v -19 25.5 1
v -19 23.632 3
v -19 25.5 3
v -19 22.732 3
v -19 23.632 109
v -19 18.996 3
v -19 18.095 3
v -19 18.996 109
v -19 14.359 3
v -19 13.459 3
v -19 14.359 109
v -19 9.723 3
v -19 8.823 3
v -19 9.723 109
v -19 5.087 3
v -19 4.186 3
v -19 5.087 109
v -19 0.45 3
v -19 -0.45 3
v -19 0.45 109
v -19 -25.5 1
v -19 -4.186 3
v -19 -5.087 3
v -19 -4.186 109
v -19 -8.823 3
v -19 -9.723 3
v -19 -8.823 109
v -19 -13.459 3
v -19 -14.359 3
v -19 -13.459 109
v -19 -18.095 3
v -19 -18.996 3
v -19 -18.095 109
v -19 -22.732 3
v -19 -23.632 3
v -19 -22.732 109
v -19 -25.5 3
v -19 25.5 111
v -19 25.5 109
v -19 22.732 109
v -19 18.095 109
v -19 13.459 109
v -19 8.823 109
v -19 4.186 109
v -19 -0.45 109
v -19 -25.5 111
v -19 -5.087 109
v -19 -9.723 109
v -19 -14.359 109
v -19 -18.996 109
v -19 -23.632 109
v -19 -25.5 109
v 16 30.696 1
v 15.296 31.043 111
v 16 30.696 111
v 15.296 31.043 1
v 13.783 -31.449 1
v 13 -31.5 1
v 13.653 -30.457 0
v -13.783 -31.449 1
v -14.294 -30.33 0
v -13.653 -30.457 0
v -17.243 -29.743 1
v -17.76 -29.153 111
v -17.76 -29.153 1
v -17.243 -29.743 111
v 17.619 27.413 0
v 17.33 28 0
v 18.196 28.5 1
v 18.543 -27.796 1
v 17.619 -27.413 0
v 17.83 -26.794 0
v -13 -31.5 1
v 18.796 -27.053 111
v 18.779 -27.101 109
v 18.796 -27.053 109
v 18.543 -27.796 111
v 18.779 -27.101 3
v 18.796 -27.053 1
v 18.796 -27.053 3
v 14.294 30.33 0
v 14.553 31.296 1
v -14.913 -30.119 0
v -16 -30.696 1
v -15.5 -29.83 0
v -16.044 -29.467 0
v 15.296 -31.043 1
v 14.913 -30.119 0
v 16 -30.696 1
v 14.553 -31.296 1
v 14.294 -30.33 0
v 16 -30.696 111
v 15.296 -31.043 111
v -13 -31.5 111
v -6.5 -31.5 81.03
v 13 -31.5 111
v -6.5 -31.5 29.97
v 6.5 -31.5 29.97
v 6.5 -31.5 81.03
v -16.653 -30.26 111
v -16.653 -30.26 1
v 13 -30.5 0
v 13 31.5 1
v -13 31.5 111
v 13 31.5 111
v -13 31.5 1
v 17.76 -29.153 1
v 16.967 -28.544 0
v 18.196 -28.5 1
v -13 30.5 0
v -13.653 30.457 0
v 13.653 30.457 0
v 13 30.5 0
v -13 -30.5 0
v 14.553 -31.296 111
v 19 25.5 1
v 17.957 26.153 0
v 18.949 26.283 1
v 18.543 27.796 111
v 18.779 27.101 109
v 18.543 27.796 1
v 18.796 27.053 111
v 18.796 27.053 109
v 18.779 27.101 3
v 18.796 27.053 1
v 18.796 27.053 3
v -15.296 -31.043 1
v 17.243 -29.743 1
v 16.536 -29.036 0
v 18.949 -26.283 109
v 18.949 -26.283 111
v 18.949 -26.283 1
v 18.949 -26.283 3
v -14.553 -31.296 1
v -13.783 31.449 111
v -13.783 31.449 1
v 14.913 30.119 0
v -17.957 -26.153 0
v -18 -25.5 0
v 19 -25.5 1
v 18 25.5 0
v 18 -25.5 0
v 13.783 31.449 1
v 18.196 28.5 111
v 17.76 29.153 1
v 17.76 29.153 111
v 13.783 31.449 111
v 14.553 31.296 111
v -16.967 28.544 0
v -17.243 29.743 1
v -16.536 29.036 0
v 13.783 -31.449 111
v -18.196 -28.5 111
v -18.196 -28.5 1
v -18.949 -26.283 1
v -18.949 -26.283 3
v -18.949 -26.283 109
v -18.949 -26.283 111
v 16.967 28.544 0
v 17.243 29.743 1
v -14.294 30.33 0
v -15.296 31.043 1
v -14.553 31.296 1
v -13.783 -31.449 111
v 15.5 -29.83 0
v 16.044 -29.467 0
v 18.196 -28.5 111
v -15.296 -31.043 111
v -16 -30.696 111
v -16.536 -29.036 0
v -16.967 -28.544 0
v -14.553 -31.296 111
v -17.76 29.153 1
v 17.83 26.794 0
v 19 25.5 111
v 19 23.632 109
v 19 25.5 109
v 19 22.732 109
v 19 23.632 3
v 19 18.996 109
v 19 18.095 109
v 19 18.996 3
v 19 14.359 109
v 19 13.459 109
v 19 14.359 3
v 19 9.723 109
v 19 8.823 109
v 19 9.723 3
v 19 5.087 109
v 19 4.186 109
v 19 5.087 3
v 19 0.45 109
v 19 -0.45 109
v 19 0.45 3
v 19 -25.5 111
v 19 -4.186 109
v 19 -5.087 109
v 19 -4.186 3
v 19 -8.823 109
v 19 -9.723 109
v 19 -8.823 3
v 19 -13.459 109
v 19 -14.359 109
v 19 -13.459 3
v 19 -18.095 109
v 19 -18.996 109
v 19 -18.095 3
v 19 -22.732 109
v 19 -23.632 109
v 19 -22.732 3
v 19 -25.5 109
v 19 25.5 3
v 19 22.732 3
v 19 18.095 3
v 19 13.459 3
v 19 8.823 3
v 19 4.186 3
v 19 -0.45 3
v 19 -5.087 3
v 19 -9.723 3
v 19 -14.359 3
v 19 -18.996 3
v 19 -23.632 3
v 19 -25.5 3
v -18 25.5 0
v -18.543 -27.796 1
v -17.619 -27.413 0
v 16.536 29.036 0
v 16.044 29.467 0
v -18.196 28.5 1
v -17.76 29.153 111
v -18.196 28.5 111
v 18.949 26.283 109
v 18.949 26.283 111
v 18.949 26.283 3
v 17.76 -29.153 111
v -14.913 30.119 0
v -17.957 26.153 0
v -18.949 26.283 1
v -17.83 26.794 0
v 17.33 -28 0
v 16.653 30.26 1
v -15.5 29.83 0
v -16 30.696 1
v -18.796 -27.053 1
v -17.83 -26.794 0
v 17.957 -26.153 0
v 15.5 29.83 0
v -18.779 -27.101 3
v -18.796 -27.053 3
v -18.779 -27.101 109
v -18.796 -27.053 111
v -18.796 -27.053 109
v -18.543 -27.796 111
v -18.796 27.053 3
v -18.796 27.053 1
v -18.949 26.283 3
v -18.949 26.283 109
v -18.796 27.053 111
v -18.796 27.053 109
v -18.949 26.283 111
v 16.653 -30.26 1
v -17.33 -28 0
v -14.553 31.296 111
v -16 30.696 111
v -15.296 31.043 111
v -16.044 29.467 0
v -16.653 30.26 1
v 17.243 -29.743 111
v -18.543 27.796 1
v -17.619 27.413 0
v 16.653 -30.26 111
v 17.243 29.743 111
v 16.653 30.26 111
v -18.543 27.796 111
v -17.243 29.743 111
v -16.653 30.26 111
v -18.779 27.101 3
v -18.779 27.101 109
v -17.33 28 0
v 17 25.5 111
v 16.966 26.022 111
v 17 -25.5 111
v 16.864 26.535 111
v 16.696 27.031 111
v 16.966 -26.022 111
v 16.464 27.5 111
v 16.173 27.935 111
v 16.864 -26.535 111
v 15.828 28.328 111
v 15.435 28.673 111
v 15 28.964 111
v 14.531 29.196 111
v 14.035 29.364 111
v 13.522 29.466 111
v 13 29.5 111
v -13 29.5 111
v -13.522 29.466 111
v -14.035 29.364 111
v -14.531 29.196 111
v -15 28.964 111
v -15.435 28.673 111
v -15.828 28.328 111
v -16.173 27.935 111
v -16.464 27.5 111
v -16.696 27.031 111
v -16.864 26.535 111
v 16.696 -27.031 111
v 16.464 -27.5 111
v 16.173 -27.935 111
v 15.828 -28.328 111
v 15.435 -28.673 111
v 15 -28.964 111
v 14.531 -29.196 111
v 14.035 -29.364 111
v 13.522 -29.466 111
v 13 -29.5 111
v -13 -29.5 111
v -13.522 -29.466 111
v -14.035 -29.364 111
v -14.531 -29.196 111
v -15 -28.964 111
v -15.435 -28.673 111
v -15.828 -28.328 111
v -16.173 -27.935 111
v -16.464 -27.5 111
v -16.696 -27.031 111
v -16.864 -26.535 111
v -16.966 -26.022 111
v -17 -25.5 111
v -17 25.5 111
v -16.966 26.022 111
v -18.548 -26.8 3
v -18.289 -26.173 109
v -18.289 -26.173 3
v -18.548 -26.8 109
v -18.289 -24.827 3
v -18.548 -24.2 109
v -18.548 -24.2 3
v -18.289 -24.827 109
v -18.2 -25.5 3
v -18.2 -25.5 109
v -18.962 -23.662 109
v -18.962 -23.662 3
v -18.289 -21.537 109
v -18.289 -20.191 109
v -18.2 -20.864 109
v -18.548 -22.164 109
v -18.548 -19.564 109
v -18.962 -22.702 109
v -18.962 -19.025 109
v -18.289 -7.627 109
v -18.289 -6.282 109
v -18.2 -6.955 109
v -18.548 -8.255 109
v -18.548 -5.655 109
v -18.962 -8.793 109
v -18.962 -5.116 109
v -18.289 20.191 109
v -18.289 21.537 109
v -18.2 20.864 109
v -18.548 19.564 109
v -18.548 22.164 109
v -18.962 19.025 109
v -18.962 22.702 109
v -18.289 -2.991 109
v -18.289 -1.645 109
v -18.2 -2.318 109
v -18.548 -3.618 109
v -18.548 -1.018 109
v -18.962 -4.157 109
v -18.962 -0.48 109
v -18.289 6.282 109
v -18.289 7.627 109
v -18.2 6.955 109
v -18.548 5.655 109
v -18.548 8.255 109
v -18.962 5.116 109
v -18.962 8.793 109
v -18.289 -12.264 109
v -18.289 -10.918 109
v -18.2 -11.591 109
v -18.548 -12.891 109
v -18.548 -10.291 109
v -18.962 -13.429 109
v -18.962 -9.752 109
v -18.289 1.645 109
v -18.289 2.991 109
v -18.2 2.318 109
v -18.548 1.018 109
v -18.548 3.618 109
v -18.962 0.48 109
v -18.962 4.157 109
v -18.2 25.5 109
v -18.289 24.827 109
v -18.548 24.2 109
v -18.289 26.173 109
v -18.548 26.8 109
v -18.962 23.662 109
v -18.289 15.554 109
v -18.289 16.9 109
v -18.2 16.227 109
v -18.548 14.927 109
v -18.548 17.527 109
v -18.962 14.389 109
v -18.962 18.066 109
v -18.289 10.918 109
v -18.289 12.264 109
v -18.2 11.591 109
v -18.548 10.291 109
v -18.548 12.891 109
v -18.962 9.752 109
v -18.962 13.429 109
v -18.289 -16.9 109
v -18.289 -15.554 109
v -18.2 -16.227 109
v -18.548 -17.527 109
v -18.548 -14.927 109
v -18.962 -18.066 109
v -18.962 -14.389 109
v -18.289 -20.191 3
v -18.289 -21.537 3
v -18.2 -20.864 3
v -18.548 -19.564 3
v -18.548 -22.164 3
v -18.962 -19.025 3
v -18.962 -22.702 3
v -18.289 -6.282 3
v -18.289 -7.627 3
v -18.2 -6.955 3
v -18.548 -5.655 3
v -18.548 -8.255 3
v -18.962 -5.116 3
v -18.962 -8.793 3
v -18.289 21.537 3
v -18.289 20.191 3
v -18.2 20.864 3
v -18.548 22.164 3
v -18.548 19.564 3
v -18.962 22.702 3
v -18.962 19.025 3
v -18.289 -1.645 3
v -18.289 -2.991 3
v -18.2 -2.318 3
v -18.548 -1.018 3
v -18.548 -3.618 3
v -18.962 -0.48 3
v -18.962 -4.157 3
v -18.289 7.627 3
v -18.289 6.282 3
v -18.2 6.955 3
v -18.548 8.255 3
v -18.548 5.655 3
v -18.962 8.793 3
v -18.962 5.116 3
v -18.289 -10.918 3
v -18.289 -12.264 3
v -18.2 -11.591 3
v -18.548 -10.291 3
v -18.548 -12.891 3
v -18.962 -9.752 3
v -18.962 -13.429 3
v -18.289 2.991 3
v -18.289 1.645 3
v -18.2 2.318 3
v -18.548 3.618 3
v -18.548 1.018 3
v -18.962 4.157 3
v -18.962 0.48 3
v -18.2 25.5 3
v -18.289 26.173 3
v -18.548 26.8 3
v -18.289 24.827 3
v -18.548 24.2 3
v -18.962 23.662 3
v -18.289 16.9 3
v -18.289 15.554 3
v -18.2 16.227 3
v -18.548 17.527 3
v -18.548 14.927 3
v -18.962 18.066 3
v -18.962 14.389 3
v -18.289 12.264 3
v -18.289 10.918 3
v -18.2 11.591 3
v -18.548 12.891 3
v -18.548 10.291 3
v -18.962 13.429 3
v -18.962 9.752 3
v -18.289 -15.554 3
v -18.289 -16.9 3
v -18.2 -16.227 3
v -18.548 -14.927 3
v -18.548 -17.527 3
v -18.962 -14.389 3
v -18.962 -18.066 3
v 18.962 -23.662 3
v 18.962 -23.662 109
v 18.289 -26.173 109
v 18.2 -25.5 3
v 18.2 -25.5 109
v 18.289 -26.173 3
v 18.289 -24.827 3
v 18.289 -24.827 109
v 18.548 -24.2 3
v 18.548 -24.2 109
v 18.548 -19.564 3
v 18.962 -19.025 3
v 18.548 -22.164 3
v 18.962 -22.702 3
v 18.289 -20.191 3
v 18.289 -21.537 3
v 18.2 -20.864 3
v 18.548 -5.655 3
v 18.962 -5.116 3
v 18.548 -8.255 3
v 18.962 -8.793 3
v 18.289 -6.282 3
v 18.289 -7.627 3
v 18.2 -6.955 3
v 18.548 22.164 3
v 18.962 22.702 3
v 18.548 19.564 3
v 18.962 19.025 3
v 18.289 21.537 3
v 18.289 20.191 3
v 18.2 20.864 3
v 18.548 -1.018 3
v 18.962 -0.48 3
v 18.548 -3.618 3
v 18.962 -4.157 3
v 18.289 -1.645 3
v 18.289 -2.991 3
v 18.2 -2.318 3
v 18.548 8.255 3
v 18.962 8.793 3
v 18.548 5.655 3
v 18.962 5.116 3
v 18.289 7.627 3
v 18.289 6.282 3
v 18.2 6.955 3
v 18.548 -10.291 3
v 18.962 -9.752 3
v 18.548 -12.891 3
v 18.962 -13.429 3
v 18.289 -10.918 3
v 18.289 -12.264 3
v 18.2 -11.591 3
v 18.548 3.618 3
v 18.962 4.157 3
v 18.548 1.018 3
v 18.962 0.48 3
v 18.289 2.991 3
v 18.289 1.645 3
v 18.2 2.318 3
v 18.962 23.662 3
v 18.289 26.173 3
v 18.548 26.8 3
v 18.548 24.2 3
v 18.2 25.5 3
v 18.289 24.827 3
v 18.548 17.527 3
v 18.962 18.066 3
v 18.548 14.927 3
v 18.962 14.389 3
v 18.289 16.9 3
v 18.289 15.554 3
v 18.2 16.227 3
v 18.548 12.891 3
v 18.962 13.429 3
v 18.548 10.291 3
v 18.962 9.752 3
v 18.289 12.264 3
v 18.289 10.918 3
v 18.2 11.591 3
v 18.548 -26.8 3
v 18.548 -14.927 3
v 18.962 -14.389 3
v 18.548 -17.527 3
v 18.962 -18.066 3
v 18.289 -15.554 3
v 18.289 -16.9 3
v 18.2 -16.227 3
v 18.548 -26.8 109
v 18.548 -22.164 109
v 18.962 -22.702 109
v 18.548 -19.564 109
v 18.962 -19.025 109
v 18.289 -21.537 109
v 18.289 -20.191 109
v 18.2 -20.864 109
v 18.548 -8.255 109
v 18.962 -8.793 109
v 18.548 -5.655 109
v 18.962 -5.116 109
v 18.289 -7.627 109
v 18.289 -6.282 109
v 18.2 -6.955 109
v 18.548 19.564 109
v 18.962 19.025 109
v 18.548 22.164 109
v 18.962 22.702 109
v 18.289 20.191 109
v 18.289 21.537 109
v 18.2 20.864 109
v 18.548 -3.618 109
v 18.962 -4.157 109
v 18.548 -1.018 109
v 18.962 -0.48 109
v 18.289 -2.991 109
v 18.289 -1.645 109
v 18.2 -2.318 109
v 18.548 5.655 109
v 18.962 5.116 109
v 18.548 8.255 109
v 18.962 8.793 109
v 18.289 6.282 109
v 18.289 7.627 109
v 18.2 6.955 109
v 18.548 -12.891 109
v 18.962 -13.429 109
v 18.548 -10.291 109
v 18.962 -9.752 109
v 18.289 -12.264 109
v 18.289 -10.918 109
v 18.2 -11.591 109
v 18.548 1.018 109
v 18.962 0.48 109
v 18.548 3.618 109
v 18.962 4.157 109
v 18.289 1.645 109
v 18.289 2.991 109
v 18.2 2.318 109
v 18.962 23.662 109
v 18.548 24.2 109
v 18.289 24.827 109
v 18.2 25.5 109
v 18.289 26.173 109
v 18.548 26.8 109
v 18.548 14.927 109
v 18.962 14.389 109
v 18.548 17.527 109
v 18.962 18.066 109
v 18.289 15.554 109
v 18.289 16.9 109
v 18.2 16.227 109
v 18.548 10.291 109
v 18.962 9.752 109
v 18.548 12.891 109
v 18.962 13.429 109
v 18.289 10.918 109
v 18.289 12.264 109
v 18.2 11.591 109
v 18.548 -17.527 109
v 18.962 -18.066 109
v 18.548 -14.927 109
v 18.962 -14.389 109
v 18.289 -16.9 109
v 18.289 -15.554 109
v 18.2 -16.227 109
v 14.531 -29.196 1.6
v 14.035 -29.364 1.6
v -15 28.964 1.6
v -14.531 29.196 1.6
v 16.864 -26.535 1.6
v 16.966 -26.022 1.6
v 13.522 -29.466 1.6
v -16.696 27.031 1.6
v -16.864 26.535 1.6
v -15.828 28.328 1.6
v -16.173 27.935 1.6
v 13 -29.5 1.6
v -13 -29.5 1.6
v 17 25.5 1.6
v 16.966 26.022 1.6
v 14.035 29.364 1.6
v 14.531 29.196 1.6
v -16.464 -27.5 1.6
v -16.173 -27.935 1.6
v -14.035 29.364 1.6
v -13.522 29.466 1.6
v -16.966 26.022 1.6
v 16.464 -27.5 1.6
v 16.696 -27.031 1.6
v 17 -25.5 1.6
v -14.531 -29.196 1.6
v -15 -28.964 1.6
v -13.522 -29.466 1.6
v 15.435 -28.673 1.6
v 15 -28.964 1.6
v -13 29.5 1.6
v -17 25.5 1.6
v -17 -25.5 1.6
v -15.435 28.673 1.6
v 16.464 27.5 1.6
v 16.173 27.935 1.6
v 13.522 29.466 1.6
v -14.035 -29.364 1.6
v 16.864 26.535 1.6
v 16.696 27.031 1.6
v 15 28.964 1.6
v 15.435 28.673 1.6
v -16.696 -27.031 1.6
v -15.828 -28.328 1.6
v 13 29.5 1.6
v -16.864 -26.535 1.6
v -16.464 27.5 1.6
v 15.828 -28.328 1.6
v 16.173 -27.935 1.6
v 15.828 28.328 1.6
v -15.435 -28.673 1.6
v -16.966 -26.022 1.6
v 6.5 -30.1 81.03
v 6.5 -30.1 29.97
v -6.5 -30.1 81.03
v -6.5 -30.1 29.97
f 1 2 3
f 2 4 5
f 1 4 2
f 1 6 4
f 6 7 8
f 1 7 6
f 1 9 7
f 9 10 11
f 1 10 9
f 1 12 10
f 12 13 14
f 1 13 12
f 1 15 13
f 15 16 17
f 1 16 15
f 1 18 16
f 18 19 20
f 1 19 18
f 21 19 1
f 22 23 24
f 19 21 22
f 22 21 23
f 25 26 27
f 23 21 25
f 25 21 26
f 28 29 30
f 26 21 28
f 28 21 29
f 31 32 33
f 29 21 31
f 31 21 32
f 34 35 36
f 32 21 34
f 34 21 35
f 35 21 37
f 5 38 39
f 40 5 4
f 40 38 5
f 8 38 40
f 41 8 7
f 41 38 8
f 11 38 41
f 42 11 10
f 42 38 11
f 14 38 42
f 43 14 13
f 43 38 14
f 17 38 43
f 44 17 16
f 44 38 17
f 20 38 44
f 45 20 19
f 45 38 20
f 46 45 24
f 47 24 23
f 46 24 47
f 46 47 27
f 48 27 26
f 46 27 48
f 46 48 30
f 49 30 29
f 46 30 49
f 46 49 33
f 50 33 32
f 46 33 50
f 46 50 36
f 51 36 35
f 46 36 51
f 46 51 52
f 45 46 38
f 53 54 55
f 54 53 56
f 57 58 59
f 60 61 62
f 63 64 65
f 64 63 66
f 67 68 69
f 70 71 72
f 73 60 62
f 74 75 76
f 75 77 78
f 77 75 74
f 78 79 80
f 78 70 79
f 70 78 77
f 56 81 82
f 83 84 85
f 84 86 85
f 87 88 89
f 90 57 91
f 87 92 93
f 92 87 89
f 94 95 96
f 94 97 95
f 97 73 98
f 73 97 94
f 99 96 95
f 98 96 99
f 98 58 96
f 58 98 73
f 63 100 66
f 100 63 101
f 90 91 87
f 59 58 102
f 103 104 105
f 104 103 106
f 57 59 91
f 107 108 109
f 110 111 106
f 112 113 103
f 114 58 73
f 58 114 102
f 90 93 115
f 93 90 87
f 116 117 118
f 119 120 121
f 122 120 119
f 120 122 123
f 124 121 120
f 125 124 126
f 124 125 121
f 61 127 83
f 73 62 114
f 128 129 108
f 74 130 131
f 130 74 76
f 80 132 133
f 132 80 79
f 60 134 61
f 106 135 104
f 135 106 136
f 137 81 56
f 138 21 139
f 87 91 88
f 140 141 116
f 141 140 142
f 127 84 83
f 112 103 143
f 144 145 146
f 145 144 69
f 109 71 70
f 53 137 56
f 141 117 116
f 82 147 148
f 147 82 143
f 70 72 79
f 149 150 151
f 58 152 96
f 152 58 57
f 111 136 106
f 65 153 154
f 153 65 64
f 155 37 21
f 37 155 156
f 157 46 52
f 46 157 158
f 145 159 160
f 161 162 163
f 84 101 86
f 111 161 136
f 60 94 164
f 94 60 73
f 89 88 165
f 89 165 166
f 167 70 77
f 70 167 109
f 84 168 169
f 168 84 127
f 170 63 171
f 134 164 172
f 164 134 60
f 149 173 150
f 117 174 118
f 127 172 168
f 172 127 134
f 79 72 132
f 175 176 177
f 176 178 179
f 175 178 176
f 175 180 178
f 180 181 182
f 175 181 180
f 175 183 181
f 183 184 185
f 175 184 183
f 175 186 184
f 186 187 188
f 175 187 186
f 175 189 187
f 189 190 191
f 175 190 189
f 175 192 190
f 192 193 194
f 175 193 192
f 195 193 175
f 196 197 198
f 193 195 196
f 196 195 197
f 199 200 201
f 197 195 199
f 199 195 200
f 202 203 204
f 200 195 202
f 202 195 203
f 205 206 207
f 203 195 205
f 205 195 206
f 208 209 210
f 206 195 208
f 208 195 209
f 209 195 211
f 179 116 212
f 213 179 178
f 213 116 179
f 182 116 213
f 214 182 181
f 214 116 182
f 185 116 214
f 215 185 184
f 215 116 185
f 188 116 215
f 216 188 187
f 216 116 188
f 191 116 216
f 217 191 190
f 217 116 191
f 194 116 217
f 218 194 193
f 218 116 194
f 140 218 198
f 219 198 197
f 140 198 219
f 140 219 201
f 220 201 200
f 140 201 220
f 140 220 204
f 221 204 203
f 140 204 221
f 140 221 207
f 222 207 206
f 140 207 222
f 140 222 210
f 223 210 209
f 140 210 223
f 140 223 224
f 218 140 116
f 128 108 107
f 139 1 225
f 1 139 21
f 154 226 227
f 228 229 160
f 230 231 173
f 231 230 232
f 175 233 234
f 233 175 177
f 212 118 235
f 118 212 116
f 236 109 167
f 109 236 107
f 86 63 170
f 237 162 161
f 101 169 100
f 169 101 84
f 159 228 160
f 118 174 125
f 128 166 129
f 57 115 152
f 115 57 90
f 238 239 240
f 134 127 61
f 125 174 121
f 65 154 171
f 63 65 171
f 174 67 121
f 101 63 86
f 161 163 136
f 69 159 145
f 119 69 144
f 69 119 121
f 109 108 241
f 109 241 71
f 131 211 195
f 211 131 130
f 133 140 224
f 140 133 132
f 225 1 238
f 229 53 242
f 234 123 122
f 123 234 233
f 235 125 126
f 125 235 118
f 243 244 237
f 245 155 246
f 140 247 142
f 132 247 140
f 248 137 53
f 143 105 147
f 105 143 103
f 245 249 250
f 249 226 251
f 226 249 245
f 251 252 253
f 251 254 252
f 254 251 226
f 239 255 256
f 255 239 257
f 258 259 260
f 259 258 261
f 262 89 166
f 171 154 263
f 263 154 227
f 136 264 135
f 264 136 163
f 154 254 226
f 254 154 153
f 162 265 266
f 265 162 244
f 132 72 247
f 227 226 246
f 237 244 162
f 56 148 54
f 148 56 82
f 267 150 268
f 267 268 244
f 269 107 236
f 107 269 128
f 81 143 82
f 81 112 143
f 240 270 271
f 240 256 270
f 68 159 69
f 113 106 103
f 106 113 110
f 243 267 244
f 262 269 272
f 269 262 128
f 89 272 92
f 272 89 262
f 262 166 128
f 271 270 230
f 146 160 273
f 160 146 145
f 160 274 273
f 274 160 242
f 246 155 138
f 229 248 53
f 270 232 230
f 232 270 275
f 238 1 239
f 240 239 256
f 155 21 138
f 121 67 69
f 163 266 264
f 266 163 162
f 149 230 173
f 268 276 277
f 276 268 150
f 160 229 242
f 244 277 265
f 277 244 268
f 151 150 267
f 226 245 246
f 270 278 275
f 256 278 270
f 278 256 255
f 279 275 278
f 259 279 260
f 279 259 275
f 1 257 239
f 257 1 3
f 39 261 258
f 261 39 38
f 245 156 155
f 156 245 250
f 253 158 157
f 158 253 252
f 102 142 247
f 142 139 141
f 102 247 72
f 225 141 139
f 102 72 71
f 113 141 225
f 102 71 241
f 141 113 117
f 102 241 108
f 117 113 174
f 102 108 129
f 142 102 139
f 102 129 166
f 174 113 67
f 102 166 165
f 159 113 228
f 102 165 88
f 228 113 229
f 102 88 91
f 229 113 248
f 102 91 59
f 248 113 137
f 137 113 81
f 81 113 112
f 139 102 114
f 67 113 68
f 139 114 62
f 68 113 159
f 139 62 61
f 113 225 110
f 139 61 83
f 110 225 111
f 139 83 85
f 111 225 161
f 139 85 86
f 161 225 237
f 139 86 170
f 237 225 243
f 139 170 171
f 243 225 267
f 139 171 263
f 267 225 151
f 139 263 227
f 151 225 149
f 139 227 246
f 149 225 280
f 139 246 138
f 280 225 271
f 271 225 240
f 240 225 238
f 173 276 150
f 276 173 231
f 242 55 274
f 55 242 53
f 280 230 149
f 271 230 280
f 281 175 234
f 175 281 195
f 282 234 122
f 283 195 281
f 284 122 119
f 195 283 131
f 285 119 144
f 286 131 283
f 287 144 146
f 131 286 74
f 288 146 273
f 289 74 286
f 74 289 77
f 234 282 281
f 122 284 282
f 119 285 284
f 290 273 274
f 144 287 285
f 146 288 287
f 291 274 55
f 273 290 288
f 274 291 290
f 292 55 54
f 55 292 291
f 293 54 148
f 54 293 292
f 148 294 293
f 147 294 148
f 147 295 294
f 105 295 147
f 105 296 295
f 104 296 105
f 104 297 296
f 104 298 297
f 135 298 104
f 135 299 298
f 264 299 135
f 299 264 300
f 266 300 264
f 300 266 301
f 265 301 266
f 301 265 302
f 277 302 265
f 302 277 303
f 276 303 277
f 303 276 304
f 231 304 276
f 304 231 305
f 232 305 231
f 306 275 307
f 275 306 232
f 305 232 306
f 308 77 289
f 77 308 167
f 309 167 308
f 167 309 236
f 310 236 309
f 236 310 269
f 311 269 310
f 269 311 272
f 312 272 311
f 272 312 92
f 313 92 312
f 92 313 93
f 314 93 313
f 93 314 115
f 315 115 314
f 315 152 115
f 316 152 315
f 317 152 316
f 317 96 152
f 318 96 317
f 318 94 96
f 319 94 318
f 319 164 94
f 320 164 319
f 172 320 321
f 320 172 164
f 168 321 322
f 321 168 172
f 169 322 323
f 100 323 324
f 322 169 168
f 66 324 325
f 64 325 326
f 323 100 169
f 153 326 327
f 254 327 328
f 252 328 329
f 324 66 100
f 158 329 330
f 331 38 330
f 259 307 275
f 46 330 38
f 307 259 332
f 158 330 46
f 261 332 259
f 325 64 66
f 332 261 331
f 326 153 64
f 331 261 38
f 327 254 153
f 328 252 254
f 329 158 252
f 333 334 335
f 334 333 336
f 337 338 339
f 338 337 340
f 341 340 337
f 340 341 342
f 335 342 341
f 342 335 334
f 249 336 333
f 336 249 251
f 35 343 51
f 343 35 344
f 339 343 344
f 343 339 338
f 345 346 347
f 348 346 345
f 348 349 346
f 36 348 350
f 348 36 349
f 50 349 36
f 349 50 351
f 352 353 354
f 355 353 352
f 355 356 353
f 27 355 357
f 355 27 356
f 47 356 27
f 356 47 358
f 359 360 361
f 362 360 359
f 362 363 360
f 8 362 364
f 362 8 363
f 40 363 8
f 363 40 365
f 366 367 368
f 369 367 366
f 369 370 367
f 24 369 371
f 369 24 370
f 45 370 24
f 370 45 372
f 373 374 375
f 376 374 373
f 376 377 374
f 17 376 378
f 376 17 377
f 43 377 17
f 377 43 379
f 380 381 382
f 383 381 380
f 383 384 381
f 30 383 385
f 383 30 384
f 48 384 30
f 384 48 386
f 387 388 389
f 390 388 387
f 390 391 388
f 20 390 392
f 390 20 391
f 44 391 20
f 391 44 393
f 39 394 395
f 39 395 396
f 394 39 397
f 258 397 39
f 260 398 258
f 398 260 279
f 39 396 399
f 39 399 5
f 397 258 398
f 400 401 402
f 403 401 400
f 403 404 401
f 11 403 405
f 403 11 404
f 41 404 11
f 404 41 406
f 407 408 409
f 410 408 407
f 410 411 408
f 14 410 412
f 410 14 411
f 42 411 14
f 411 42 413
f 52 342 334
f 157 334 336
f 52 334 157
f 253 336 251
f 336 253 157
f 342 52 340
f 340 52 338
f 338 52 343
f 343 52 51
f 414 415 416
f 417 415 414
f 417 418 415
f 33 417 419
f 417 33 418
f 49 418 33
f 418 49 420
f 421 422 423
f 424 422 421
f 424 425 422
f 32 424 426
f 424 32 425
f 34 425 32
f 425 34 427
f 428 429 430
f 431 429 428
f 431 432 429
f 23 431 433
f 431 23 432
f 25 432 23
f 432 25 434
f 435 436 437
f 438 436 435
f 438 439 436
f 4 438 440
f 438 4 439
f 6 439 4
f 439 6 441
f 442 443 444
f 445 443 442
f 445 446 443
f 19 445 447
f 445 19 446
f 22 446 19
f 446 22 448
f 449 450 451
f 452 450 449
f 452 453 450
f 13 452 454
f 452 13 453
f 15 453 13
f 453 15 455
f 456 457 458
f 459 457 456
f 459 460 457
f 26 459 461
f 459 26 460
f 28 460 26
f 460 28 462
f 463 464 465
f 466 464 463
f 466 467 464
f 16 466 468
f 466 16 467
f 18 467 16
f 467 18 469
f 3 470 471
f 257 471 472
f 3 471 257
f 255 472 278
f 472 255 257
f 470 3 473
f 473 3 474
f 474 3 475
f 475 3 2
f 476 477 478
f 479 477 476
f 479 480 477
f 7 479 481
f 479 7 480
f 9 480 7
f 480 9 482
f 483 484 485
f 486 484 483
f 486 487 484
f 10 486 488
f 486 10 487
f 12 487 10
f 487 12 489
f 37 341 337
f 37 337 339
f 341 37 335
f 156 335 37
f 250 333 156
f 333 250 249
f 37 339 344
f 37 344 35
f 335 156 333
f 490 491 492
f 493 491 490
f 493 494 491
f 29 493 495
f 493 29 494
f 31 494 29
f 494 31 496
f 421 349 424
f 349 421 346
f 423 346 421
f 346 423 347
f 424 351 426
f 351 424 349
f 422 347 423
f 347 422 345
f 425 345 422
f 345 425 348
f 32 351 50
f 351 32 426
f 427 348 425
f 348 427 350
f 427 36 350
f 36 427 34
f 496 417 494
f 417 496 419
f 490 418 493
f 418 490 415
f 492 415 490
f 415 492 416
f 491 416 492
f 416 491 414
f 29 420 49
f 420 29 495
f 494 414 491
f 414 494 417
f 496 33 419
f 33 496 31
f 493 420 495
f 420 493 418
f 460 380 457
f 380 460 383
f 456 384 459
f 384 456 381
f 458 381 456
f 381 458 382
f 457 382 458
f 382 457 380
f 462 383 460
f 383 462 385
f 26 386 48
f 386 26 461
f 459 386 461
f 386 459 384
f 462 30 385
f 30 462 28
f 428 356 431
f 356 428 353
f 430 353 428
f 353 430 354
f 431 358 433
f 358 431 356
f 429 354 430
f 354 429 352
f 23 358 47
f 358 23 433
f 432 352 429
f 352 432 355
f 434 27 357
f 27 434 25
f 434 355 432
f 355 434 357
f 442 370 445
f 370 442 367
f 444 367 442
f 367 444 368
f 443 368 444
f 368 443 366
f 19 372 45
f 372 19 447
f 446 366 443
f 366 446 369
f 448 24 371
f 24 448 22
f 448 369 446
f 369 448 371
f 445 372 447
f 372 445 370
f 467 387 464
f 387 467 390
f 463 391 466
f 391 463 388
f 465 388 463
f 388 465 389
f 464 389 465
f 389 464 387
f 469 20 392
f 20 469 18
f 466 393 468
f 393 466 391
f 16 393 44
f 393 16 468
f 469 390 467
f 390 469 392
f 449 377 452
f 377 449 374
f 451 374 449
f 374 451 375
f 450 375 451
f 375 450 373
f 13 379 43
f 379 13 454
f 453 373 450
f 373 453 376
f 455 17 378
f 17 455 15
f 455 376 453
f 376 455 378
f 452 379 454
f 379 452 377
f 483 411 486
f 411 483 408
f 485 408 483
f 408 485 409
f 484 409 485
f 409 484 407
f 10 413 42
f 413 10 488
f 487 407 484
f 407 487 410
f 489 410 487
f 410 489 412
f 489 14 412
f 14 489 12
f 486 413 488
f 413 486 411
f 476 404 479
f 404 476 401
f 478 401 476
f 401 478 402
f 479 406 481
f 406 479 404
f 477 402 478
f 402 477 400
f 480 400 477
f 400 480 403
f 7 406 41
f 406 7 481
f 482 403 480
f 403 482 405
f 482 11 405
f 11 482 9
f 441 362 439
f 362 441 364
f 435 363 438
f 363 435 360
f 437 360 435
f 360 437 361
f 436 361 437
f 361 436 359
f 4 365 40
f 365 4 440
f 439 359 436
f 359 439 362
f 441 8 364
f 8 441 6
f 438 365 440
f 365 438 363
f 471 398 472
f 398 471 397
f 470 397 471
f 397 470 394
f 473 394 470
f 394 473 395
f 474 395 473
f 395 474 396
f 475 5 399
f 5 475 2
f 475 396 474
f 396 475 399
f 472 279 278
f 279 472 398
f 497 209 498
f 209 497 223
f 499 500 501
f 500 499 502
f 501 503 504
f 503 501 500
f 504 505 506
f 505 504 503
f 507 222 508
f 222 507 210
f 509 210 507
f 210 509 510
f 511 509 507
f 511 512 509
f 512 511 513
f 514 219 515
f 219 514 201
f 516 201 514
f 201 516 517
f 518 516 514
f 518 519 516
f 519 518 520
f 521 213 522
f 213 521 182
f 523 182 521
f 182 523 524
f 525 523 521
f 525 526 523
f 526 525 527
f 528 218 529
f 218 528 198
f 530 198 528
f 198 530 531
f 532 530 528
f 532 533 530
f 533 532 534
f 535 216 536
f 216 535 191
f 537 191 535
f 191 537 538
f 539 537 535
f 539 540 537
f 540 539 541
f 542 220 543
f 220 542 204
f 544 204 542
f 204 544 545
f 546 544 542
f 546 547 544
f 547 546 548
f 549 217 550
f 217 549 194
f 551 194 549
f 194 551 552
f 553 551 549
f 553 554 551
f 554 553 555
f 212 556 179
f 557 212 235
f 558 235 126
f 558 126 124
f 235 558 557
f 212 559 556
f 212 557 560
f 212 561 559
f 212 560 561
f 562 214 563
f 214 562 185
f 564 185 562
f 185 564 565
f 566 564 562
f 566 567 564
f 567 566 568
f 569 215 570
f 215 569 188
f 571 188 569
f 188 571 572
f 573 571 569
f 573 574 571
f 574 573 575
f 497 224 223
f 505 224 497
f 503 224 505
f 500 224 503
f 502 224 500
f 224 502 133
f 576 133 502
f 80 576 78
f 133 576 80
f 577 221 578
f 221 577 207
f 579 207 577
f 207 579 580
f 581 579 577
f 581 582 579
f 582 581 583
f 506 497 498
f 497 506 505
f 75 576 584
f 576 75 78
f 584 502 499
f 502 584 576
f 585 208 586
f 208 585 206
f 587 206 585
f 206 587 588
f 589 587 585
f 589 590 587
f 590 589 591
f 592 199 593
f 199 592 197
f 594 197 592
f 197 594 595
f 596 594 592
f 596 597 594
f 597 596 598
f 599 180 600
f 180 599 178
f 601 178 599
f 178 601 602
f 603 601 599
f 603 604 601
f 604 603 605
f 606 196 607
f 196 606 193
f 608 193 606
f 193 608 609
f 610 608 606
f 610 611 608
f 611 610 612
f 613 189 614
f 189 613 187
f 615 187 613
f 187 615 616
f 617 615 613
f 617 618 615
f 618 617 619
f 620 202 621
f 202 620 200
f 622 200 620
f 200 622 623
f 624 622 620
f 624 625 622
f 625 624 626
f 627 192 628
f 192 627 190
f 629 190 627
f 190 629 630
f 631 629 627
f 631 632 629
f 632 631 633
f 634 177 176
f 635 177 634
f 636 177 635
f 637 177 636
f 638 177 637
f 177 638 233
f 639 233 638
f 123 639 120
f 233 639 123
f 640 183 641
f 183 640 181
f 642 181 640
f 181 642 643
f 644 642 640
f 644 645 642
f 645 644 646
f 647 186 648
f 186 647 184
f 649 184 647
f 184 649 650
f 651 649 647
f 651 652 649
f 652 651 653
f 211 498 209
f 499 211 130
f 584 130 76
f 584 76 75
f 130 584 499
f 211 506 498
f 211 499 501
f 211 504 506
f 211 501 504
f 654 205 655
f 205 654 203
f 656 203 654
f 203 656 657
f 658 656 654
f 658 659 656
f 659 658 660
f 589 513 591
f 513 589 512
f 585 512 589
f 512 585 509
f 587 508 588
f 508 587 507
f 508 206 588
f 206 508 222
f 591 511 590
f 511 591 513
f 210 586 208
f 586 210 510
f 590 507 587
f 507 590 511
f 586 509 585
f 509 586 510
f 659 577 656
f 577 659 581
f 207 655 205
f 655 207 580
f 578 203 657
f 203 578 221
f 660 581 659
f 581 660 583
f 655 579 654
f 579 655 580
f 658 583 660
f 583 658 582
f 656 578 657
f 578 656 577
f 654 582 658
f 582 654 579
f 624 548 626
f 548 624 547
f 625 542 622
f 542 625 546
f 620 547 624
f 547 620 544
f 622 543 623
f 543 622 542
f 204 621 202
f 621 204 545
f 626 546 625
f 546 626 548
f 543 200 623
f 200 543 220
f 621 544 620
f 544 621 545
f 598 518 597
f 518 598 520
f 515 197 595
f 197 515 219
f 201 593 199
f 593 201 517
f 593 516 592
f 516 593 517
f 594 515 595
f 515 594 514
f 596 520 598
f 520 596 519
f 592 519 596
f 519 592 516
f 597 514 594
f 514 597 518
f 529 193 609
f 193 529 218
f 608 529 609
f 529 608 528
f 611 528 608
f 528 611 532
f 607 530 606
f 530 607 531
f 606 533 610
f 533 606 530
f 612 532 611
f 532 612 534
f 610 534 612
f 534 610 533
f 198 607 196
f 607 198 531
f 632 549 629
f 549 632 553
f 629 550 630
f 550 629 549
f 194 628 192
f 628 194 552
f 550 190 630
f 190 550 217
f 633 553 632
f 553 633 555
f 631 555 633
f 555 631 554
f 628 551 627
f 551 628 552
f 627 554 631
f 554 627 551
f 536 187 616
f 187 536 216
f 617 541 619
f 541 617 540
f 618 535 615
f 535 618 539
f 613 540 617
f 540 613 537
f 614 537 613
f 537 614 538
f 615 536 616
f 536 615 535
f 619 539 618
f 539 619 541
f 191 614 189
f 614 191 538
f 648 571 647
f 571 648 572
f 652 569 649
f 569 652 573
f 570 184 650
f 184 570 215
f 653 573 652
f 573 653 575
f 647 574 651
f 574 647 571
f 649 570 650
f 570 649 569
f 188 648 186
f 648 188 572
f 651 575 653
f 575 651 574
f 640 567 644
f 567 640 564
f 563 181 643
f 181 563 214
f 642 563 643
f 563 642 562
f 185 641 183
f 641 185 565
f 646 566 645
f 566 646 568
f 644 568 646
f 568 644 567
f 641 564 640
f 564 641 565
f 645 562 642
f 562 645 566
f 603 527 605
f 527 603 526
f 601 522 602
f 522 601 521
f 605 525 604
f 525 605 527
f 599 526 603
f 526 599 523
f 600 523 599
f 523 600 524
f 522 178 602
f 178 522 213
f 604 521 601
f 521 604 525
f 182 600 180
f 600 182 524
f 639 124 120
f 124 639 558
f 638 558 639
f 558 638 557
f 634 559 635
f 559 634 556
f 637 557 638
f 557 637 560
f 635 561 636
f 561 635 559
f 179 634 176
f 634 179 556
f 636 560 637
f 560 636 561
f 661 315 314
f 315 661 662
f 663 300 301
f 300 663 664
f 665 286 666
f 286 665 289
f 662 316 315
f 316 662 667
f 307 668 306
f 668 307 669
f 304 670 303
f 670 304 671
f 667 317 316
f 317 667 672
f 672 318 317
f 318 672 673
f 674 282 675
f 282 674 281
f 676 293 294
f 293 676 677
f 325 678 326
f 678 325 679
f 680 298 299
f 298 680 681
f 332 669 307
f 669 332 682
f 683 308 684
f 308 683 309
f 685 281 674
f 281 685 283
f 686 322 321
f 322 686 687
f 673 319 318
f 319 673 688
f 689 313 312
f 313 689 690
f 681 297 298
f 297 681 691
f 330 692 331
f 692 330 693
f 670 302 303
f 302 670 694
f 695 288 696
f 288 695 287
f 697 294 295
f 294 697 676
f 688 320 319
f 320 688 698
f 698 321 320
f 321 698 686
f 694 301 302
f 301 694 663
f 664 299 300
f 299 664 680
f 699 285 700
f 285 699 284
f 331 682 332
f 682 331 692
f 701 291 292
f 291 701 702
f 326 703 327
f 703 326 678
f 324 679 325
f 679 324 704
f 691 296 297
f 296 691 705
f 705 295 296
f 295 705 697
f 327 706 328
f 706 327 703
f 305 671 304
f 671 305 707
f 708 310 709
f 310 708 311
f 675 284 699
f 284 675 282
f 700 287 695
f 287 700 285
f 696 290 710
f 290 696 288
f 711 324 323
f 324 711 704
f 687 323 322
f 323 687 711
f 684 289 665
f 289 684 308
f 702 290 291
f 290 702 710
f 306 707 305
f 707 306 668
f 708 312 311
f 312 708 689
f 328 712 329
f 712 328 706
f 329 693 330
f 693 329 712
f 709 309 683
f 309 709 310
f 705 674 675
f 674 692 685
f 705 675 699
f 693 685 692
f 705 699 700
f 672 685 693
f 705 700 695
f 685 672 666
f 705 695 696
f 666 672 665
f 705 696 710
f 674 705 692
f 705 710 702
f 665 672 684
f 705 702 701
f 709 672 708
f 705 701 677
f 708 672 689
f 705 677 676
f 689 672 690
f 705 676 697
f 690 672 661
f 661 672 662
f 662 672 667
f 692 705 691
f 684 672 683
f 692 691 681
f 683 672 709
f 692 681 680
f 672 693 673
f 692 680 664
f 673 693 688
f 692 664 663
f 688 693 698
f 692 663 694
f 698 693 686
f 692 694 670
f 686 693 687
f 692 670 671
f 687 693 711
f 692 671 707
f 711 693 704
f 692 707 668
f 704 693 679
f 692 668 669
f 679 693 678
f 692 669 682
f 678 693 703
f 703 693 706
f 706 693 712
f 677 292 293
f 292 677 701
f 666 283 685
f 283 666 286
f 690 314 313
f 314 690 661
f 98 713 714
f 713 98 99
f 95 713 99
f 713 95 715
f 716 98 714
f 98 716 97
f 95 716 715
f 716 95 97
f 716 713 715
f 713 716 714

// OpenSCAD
// =====================================================================
// CordCase - upright capsule cable storage
//
// An original take on the same idea as CableCap: one sealed, labelled,
// stand-up case per cable instead of an open bin. Built from scratch;
// dimensions chosen to match the same shelf/drawer use case.
//
// Sized for a FlashForge Adventurer 3C (150 x 150 x 150 mm). Note the
// 152 mm "tall" size in that product family does NOT fit a 150 mm bed -
// this system tops out at 145 mm so it prints upright without tricks.
//
//   openscad -o out.stl -D 'part="body"' -D fw=38 -D fd=63 -D h=127 cordcase.scad
// =====================================================================

/* [Part select] */
part = "body";       // body | cap | plate | label | rack
fw   = 38;           // footprint width
fd   = 63;           // footprint depth
h    = 127;          // overall height including the cap
nx   = 3;            // baseplate: sockets across

/* [Shell] */
wall     = 2.0;
floor_th = 1.6;
corner_r = 6.0;
foot_ch  = 1.0;      // 45 deg lead-in chamfer at the very bottom

/* [Cap] */
cap_h    = 16;       // how tall the contrasting cap stands
cap_wall = 2.0;
cap_skirt = 10;      // inner skirt that plugs down into the body
cap_cl   = 0.35;     // friction-fit clearance

/* [Ribs] */
// Vertical ribs cut into the long faces. Cut inward, so the footprint is
// unchanged and cases still stand shoulder to shoulder in a baseplate.
rib_d    = 0.8;
rib_r    = 2.6;
rib_gap  = 4.6;      // < chord width, so ribs run together into a fluted face

/* [Label plate] */
// A recessed panel down the front face. The printed plate drops in and is
// read bottom-to-top, the way a spine label is.
lab_w    = 13;       // plate width
lab_frac = 0.46;     // plate height as a fraction of body height
lab_deep = 1.4;      // recess depth
lab_t    = 1.0;      // plate thickness (prints this + 0.6 mm of text)
lab_cl   = 0.15;    // light interference: the plate friction-fits into the panel

/* [Drawer rack] */
// A toast-rack of leaning fins. Each capsule drops into a slot and tips back
// against the next fin, so a drawerful reads like a card index from above.
// Fins lean by rack_ang from vertical; keep that under 45 deg and every face
// stays self-supporting, so the rack prints flat on its base with no supports.
rack_ang  = 20;      // lean from vertical, degrees
rack_fin  = 2.2;     // fin thickness
rack_base = 3.0;     // base plate thickness
rack_cl   = 1.2;     // slot clearance on the capsule's across-slot dimension
rack_wall = 2.4;     // end walls
rack_fh   = 16;      // how far a divider stands above the ramp
rack_lip  = 9;       // retaining lip at the low end
slots     = 3;       // slots per tile

/* [Tile interlock] */
// Racks and docks tile along X. A dovetail on the +X edge and a matching slot
// on -X means a row of tiles physically locks together instead of drifting
// apart in a drawer. Vertical prism, so it needs no support.
dt_len  = 4;
dt_neck = 4;
dt_head = 6;
dt_cl   = 0.35;

/* [Baseplate] */
plate_h  = 5.0;
sock_cl  = 0.4;
sock_d   = 3.0;      // how deep a case sits into the plate

$fn = 48;

// ------------------------------------------------------------ primitives

module dt2d(neck, head, len) {
    polygon([[0, -neck / 2], [len, -head / 2], [len, head / 2], [0, neck / 2]]);
}

// Tail on +X, slot on -X, cut through the full height of the tile edge.
module tile_link(L, H, add) {
    if (add) translate([L / 2, 0, 0]) linear_extrude(H) dt2d(dt_neck, dt_head, dt_len);
    else translate([-L / 2, 0, -0.5]) linear_extrude(H + 1)
        dt2d(dt_neck + dt_cl, dt_head + dt_cl, dt_len + dt_cl / 2);
}

module rr(w, d, r, hh) {
    rr_ = max(min(r, w / 2 - 0.01, d / 2 - 0.01), 0.2);
    linear_extrude(hh) offset(r = rr_) square([w - 2 * rr_, d - 2 * rr_], center = true);
}

function body_h(hh) = hh - cap_h;          // the cap makes up the rest
function lab_h(hh) = body_h(hh) * lab_frac;

// Vertical fluting down the two long faces.
module ribs(w, d, z0, z1) {
    n = max(2, floor((d - 2 * corner_r) / rib_gap));
    span = d - 2 * corner_r;
    for (side = [-1, 1])
        for (i = [0:n])
            translate([side * (w / 2 + rib_r - rib_d), -span / 2 + i * span / n, z0])
                cylinder(r = rib_r, h = z1 - z0, $fn = 24);
}

// --------------------------------------------------------------- body

module body(w, d, hh) {
    bh = body_h(hh);
    lh = lab_h(hh);
    difference() {
        // outer shell with a chamfered foot
        union() {
            hull() {
                translate([0, 0, 0]) rr(w - 2 * foot_ch, d - 2 * foot_ch, corner_r - foot_ch, 0.01);
                translate([0, 0, foot_ch]) rr(w, d, corner_r, 0.01);
            }
            translate([0, 0, foot_ch]) rr(w, d, corner_r, bh - foot_ch);
        }
        // cavity, open at the top
        translate([0, 0, floor_th]) rr(w - 2 * wall, d - 2 * wall, corner_r - wall, bh);
        ribs(w, d, foot_ch + 2, bh - 2);
        // recessed label panel down the front face
        translate([-lab_w / 2, -d / 2 - 0.1, (bh - lh) / 2])
            cube([lab_w, lab_deep + 0.1, lh]);
    }
}

// ---------------------------------------------------------------- cap

module cap(w, d, hh) {
    skirt_o = w - 2 * wall - cap_cl;          // slides into the body mouth
    skirt_od = d - 2 * wall - cap_cl;
    difference() {
        union() {
            rr(w, d, corner_r, cap_h - 1.2);
            hull() {                          // softened crown
                translate([0, 0, cap_h - 1.2]) rr(w, d, corner_r, 0.01);
                translate([0, 0, cap_h]) rr(w - 2.4, d - 2.4, corner_r - 1.2, 0.01);
            }
            // skirt hangs below the shoulder; solid here so it welds to the crown
            translate([0, 0, -cap_skirt])
                rr(skirt_o, skirt_od, corner_r - wall, cap_skirt);
        }
        // one bore up through skirt and crown together
        translate([0, 0, -cap_skirt - 0.01])
            rr(skirt_o - 2 * cap_wall, skirt_od - 2 * cap_wall, corner_r - wall - cap_wall,
               cap_skirt + cap_h - cap_wall);
        ribs(w, d, 1.5, cap_h - 3);
    }
}

// -------------------------------------------------------------- label

// Printed flat, text raised. Reads bottom-to-top like a spine label.
module label(hh, txt) {
    lh = lab_h(hh) - lab_cl;
    lw = lab_w - lab_cl;
    tsize = (txt == "") ? 6 : min(8, (lw - 3), (lh - 6) / max(len(txt) * 0.62, 1) * 1.6);
    linear_extrude(lab_t) offset(r = 0.8) square([lw - 1.6, lh - 1.6], center = true);
    if (txt != "")
        translate([0, 0, lab_t]) linear_extrude(0.6) rotate([0, 0, 90])
            text(txt, size = tsize, halign = "center", valign = "center");
}

// ----------------------------------------------------------- baseplate

module plate(w, d, nx, ny) {
    W = nx * (w + 3) + 6;
    D = ny * (d + 3) + 6;
    difference() {
        union() {
            rr(W, D, corner_r, plate_h);
            tile_link(W, plate_h, true);
        }
        tile_link(W, plate_h, false);
        for (i = [0:nx - 1], j = [0:ny - 1])
            translate([(i - (nx - 1) / 2) * (w + 3), (j - (ny - 1) / 2) * (d + 3),
                       plate_h - sock_d])
                hull() {
                    rr(w - 2 * foot_ch + sock_cl, d - 2 * foot_ch + sock_cl,
                       corner_r - foot_ch, 0.01);
                    translate([0, 0, foot_ch])
                        rr(w + sock_cl, d + sock_cl, corner_r, sock_d);
                }
    }
}

// --------------------------------------------------------- drawer rack

// An inclined tray: the floor ramps up at rack_ang, vertical dividers run UP
// the slope, and a lip at the low end stops anything sliding out. Capsules lie
// back in the slots so their spine labels face up and out, the way a card index
// reads. The lean runs along the dividers, not across them, so slot pitch only
// has to clear the capsule's width.
//
// Every face is a ramp, a vertical wall or a 45 deg chamfer - prints flat on
// the base with no supports.
function rack_pitch(cw) = cw + rack_cl + rack_fin;
function rack_len(cw, n) = n * rack_pitch(cw) + rack_fin;
// A capsule sits square on the incline, so it leans rack_ang from vertical and
// the slope only has to be as long as its footprint - not its height.
function rack_run(cd, h) = cd + 2 * rack_wall;
// Tall enough to catch the capsule well above its centre of mass.
function back_wall_h(h, rise) = max(rack_base + rise + rack_fh, h * 0.42);

module rack(cw, cd, n, h = 101) {
    L = rack_len(cw, n);
    R = rack_run(cd, h);
    rise = R * tan(rack_ang);
    difference() {
        union() {
            // ramp: a wedge rising toward the back
            hull() {
                translate([0, -R / 2 + 1, 0]) cube([L, 2, rack_base], center = true);
                translate([0, R / 2 - 1, rise / 2]) cube([L, 2, rack_base + rise], center = true);
            }
            // dividers, running the FULL length of the slope so a capsule is
            // guided along its whole footprint rather than only at the front
            for (i = [0:n]) {
                outer = (i == 0 || i == n);
                t = outer ? rack_wall : rack_fin;      // outer ones are proper side walls
                // A thicker outer wall must stay INSIDE the tile edge, or two
                // tiles butted at pitch overlap and will not seat.
                x = (i == 0) ? -L / 2 + t / 2
                  : (i == n) ?  L / 2 - t / 2
                  : -L / 2 + rack_fin / 2 + i * rack_pitch(cw);
                translate([x, 0, 0])
                    hull() {
                        translate([0, -R / 2 + 1, 0])
                            cube([t, 2, rack_base + rack_fh], center = true);
                        translate([0, R / 2 - 1, rise / 2])
                            cube([t, 2, rack_base + rise + rack_fh], center = true);
                    }
            }
            // Back wall doubles as a backrest. A tall narrow capsule leaning
            // 20 deg has its centre of mass close to its rear edge - the Small
            // has only 1.7 mm of tip-over margin - so the wall has to positively
            // support it, not just stop it sliding out. Scaled to the capsule.
            translate([0, R / 2 - rack_wall / 2, back_wall_h(h, rise) / 2])
                cube([L, rack_wall, back_wall_h(h, rise)], center = true);
            // retaining lip at the low end
            translate([0, -R / 2 + rack_wall / 2, rack_base / 2 + rack_lip / 2])
                cube([L, rack_wall, rack_base + rack_lip], center = true);
            tile_link(L, rack_base, true);
        }
        tile_link(L, rack_base, false);
        translate([0, 0, -50]) cube([L * 4, R * 4, 100], center = true);
    }
}

// -------------------------------------------------------------- render

if (part == "body")       body(fw, fd, h);
else if (part == "cap")   cap(fw, fd, h);
else if (part == "plate") plate(fw, fd, nx, 1);
else if (part == "label") label(h, label_text == "" ? "USB-C" : label_text);
else if (part == "rack")  rack(fw, fd, slots, h);
